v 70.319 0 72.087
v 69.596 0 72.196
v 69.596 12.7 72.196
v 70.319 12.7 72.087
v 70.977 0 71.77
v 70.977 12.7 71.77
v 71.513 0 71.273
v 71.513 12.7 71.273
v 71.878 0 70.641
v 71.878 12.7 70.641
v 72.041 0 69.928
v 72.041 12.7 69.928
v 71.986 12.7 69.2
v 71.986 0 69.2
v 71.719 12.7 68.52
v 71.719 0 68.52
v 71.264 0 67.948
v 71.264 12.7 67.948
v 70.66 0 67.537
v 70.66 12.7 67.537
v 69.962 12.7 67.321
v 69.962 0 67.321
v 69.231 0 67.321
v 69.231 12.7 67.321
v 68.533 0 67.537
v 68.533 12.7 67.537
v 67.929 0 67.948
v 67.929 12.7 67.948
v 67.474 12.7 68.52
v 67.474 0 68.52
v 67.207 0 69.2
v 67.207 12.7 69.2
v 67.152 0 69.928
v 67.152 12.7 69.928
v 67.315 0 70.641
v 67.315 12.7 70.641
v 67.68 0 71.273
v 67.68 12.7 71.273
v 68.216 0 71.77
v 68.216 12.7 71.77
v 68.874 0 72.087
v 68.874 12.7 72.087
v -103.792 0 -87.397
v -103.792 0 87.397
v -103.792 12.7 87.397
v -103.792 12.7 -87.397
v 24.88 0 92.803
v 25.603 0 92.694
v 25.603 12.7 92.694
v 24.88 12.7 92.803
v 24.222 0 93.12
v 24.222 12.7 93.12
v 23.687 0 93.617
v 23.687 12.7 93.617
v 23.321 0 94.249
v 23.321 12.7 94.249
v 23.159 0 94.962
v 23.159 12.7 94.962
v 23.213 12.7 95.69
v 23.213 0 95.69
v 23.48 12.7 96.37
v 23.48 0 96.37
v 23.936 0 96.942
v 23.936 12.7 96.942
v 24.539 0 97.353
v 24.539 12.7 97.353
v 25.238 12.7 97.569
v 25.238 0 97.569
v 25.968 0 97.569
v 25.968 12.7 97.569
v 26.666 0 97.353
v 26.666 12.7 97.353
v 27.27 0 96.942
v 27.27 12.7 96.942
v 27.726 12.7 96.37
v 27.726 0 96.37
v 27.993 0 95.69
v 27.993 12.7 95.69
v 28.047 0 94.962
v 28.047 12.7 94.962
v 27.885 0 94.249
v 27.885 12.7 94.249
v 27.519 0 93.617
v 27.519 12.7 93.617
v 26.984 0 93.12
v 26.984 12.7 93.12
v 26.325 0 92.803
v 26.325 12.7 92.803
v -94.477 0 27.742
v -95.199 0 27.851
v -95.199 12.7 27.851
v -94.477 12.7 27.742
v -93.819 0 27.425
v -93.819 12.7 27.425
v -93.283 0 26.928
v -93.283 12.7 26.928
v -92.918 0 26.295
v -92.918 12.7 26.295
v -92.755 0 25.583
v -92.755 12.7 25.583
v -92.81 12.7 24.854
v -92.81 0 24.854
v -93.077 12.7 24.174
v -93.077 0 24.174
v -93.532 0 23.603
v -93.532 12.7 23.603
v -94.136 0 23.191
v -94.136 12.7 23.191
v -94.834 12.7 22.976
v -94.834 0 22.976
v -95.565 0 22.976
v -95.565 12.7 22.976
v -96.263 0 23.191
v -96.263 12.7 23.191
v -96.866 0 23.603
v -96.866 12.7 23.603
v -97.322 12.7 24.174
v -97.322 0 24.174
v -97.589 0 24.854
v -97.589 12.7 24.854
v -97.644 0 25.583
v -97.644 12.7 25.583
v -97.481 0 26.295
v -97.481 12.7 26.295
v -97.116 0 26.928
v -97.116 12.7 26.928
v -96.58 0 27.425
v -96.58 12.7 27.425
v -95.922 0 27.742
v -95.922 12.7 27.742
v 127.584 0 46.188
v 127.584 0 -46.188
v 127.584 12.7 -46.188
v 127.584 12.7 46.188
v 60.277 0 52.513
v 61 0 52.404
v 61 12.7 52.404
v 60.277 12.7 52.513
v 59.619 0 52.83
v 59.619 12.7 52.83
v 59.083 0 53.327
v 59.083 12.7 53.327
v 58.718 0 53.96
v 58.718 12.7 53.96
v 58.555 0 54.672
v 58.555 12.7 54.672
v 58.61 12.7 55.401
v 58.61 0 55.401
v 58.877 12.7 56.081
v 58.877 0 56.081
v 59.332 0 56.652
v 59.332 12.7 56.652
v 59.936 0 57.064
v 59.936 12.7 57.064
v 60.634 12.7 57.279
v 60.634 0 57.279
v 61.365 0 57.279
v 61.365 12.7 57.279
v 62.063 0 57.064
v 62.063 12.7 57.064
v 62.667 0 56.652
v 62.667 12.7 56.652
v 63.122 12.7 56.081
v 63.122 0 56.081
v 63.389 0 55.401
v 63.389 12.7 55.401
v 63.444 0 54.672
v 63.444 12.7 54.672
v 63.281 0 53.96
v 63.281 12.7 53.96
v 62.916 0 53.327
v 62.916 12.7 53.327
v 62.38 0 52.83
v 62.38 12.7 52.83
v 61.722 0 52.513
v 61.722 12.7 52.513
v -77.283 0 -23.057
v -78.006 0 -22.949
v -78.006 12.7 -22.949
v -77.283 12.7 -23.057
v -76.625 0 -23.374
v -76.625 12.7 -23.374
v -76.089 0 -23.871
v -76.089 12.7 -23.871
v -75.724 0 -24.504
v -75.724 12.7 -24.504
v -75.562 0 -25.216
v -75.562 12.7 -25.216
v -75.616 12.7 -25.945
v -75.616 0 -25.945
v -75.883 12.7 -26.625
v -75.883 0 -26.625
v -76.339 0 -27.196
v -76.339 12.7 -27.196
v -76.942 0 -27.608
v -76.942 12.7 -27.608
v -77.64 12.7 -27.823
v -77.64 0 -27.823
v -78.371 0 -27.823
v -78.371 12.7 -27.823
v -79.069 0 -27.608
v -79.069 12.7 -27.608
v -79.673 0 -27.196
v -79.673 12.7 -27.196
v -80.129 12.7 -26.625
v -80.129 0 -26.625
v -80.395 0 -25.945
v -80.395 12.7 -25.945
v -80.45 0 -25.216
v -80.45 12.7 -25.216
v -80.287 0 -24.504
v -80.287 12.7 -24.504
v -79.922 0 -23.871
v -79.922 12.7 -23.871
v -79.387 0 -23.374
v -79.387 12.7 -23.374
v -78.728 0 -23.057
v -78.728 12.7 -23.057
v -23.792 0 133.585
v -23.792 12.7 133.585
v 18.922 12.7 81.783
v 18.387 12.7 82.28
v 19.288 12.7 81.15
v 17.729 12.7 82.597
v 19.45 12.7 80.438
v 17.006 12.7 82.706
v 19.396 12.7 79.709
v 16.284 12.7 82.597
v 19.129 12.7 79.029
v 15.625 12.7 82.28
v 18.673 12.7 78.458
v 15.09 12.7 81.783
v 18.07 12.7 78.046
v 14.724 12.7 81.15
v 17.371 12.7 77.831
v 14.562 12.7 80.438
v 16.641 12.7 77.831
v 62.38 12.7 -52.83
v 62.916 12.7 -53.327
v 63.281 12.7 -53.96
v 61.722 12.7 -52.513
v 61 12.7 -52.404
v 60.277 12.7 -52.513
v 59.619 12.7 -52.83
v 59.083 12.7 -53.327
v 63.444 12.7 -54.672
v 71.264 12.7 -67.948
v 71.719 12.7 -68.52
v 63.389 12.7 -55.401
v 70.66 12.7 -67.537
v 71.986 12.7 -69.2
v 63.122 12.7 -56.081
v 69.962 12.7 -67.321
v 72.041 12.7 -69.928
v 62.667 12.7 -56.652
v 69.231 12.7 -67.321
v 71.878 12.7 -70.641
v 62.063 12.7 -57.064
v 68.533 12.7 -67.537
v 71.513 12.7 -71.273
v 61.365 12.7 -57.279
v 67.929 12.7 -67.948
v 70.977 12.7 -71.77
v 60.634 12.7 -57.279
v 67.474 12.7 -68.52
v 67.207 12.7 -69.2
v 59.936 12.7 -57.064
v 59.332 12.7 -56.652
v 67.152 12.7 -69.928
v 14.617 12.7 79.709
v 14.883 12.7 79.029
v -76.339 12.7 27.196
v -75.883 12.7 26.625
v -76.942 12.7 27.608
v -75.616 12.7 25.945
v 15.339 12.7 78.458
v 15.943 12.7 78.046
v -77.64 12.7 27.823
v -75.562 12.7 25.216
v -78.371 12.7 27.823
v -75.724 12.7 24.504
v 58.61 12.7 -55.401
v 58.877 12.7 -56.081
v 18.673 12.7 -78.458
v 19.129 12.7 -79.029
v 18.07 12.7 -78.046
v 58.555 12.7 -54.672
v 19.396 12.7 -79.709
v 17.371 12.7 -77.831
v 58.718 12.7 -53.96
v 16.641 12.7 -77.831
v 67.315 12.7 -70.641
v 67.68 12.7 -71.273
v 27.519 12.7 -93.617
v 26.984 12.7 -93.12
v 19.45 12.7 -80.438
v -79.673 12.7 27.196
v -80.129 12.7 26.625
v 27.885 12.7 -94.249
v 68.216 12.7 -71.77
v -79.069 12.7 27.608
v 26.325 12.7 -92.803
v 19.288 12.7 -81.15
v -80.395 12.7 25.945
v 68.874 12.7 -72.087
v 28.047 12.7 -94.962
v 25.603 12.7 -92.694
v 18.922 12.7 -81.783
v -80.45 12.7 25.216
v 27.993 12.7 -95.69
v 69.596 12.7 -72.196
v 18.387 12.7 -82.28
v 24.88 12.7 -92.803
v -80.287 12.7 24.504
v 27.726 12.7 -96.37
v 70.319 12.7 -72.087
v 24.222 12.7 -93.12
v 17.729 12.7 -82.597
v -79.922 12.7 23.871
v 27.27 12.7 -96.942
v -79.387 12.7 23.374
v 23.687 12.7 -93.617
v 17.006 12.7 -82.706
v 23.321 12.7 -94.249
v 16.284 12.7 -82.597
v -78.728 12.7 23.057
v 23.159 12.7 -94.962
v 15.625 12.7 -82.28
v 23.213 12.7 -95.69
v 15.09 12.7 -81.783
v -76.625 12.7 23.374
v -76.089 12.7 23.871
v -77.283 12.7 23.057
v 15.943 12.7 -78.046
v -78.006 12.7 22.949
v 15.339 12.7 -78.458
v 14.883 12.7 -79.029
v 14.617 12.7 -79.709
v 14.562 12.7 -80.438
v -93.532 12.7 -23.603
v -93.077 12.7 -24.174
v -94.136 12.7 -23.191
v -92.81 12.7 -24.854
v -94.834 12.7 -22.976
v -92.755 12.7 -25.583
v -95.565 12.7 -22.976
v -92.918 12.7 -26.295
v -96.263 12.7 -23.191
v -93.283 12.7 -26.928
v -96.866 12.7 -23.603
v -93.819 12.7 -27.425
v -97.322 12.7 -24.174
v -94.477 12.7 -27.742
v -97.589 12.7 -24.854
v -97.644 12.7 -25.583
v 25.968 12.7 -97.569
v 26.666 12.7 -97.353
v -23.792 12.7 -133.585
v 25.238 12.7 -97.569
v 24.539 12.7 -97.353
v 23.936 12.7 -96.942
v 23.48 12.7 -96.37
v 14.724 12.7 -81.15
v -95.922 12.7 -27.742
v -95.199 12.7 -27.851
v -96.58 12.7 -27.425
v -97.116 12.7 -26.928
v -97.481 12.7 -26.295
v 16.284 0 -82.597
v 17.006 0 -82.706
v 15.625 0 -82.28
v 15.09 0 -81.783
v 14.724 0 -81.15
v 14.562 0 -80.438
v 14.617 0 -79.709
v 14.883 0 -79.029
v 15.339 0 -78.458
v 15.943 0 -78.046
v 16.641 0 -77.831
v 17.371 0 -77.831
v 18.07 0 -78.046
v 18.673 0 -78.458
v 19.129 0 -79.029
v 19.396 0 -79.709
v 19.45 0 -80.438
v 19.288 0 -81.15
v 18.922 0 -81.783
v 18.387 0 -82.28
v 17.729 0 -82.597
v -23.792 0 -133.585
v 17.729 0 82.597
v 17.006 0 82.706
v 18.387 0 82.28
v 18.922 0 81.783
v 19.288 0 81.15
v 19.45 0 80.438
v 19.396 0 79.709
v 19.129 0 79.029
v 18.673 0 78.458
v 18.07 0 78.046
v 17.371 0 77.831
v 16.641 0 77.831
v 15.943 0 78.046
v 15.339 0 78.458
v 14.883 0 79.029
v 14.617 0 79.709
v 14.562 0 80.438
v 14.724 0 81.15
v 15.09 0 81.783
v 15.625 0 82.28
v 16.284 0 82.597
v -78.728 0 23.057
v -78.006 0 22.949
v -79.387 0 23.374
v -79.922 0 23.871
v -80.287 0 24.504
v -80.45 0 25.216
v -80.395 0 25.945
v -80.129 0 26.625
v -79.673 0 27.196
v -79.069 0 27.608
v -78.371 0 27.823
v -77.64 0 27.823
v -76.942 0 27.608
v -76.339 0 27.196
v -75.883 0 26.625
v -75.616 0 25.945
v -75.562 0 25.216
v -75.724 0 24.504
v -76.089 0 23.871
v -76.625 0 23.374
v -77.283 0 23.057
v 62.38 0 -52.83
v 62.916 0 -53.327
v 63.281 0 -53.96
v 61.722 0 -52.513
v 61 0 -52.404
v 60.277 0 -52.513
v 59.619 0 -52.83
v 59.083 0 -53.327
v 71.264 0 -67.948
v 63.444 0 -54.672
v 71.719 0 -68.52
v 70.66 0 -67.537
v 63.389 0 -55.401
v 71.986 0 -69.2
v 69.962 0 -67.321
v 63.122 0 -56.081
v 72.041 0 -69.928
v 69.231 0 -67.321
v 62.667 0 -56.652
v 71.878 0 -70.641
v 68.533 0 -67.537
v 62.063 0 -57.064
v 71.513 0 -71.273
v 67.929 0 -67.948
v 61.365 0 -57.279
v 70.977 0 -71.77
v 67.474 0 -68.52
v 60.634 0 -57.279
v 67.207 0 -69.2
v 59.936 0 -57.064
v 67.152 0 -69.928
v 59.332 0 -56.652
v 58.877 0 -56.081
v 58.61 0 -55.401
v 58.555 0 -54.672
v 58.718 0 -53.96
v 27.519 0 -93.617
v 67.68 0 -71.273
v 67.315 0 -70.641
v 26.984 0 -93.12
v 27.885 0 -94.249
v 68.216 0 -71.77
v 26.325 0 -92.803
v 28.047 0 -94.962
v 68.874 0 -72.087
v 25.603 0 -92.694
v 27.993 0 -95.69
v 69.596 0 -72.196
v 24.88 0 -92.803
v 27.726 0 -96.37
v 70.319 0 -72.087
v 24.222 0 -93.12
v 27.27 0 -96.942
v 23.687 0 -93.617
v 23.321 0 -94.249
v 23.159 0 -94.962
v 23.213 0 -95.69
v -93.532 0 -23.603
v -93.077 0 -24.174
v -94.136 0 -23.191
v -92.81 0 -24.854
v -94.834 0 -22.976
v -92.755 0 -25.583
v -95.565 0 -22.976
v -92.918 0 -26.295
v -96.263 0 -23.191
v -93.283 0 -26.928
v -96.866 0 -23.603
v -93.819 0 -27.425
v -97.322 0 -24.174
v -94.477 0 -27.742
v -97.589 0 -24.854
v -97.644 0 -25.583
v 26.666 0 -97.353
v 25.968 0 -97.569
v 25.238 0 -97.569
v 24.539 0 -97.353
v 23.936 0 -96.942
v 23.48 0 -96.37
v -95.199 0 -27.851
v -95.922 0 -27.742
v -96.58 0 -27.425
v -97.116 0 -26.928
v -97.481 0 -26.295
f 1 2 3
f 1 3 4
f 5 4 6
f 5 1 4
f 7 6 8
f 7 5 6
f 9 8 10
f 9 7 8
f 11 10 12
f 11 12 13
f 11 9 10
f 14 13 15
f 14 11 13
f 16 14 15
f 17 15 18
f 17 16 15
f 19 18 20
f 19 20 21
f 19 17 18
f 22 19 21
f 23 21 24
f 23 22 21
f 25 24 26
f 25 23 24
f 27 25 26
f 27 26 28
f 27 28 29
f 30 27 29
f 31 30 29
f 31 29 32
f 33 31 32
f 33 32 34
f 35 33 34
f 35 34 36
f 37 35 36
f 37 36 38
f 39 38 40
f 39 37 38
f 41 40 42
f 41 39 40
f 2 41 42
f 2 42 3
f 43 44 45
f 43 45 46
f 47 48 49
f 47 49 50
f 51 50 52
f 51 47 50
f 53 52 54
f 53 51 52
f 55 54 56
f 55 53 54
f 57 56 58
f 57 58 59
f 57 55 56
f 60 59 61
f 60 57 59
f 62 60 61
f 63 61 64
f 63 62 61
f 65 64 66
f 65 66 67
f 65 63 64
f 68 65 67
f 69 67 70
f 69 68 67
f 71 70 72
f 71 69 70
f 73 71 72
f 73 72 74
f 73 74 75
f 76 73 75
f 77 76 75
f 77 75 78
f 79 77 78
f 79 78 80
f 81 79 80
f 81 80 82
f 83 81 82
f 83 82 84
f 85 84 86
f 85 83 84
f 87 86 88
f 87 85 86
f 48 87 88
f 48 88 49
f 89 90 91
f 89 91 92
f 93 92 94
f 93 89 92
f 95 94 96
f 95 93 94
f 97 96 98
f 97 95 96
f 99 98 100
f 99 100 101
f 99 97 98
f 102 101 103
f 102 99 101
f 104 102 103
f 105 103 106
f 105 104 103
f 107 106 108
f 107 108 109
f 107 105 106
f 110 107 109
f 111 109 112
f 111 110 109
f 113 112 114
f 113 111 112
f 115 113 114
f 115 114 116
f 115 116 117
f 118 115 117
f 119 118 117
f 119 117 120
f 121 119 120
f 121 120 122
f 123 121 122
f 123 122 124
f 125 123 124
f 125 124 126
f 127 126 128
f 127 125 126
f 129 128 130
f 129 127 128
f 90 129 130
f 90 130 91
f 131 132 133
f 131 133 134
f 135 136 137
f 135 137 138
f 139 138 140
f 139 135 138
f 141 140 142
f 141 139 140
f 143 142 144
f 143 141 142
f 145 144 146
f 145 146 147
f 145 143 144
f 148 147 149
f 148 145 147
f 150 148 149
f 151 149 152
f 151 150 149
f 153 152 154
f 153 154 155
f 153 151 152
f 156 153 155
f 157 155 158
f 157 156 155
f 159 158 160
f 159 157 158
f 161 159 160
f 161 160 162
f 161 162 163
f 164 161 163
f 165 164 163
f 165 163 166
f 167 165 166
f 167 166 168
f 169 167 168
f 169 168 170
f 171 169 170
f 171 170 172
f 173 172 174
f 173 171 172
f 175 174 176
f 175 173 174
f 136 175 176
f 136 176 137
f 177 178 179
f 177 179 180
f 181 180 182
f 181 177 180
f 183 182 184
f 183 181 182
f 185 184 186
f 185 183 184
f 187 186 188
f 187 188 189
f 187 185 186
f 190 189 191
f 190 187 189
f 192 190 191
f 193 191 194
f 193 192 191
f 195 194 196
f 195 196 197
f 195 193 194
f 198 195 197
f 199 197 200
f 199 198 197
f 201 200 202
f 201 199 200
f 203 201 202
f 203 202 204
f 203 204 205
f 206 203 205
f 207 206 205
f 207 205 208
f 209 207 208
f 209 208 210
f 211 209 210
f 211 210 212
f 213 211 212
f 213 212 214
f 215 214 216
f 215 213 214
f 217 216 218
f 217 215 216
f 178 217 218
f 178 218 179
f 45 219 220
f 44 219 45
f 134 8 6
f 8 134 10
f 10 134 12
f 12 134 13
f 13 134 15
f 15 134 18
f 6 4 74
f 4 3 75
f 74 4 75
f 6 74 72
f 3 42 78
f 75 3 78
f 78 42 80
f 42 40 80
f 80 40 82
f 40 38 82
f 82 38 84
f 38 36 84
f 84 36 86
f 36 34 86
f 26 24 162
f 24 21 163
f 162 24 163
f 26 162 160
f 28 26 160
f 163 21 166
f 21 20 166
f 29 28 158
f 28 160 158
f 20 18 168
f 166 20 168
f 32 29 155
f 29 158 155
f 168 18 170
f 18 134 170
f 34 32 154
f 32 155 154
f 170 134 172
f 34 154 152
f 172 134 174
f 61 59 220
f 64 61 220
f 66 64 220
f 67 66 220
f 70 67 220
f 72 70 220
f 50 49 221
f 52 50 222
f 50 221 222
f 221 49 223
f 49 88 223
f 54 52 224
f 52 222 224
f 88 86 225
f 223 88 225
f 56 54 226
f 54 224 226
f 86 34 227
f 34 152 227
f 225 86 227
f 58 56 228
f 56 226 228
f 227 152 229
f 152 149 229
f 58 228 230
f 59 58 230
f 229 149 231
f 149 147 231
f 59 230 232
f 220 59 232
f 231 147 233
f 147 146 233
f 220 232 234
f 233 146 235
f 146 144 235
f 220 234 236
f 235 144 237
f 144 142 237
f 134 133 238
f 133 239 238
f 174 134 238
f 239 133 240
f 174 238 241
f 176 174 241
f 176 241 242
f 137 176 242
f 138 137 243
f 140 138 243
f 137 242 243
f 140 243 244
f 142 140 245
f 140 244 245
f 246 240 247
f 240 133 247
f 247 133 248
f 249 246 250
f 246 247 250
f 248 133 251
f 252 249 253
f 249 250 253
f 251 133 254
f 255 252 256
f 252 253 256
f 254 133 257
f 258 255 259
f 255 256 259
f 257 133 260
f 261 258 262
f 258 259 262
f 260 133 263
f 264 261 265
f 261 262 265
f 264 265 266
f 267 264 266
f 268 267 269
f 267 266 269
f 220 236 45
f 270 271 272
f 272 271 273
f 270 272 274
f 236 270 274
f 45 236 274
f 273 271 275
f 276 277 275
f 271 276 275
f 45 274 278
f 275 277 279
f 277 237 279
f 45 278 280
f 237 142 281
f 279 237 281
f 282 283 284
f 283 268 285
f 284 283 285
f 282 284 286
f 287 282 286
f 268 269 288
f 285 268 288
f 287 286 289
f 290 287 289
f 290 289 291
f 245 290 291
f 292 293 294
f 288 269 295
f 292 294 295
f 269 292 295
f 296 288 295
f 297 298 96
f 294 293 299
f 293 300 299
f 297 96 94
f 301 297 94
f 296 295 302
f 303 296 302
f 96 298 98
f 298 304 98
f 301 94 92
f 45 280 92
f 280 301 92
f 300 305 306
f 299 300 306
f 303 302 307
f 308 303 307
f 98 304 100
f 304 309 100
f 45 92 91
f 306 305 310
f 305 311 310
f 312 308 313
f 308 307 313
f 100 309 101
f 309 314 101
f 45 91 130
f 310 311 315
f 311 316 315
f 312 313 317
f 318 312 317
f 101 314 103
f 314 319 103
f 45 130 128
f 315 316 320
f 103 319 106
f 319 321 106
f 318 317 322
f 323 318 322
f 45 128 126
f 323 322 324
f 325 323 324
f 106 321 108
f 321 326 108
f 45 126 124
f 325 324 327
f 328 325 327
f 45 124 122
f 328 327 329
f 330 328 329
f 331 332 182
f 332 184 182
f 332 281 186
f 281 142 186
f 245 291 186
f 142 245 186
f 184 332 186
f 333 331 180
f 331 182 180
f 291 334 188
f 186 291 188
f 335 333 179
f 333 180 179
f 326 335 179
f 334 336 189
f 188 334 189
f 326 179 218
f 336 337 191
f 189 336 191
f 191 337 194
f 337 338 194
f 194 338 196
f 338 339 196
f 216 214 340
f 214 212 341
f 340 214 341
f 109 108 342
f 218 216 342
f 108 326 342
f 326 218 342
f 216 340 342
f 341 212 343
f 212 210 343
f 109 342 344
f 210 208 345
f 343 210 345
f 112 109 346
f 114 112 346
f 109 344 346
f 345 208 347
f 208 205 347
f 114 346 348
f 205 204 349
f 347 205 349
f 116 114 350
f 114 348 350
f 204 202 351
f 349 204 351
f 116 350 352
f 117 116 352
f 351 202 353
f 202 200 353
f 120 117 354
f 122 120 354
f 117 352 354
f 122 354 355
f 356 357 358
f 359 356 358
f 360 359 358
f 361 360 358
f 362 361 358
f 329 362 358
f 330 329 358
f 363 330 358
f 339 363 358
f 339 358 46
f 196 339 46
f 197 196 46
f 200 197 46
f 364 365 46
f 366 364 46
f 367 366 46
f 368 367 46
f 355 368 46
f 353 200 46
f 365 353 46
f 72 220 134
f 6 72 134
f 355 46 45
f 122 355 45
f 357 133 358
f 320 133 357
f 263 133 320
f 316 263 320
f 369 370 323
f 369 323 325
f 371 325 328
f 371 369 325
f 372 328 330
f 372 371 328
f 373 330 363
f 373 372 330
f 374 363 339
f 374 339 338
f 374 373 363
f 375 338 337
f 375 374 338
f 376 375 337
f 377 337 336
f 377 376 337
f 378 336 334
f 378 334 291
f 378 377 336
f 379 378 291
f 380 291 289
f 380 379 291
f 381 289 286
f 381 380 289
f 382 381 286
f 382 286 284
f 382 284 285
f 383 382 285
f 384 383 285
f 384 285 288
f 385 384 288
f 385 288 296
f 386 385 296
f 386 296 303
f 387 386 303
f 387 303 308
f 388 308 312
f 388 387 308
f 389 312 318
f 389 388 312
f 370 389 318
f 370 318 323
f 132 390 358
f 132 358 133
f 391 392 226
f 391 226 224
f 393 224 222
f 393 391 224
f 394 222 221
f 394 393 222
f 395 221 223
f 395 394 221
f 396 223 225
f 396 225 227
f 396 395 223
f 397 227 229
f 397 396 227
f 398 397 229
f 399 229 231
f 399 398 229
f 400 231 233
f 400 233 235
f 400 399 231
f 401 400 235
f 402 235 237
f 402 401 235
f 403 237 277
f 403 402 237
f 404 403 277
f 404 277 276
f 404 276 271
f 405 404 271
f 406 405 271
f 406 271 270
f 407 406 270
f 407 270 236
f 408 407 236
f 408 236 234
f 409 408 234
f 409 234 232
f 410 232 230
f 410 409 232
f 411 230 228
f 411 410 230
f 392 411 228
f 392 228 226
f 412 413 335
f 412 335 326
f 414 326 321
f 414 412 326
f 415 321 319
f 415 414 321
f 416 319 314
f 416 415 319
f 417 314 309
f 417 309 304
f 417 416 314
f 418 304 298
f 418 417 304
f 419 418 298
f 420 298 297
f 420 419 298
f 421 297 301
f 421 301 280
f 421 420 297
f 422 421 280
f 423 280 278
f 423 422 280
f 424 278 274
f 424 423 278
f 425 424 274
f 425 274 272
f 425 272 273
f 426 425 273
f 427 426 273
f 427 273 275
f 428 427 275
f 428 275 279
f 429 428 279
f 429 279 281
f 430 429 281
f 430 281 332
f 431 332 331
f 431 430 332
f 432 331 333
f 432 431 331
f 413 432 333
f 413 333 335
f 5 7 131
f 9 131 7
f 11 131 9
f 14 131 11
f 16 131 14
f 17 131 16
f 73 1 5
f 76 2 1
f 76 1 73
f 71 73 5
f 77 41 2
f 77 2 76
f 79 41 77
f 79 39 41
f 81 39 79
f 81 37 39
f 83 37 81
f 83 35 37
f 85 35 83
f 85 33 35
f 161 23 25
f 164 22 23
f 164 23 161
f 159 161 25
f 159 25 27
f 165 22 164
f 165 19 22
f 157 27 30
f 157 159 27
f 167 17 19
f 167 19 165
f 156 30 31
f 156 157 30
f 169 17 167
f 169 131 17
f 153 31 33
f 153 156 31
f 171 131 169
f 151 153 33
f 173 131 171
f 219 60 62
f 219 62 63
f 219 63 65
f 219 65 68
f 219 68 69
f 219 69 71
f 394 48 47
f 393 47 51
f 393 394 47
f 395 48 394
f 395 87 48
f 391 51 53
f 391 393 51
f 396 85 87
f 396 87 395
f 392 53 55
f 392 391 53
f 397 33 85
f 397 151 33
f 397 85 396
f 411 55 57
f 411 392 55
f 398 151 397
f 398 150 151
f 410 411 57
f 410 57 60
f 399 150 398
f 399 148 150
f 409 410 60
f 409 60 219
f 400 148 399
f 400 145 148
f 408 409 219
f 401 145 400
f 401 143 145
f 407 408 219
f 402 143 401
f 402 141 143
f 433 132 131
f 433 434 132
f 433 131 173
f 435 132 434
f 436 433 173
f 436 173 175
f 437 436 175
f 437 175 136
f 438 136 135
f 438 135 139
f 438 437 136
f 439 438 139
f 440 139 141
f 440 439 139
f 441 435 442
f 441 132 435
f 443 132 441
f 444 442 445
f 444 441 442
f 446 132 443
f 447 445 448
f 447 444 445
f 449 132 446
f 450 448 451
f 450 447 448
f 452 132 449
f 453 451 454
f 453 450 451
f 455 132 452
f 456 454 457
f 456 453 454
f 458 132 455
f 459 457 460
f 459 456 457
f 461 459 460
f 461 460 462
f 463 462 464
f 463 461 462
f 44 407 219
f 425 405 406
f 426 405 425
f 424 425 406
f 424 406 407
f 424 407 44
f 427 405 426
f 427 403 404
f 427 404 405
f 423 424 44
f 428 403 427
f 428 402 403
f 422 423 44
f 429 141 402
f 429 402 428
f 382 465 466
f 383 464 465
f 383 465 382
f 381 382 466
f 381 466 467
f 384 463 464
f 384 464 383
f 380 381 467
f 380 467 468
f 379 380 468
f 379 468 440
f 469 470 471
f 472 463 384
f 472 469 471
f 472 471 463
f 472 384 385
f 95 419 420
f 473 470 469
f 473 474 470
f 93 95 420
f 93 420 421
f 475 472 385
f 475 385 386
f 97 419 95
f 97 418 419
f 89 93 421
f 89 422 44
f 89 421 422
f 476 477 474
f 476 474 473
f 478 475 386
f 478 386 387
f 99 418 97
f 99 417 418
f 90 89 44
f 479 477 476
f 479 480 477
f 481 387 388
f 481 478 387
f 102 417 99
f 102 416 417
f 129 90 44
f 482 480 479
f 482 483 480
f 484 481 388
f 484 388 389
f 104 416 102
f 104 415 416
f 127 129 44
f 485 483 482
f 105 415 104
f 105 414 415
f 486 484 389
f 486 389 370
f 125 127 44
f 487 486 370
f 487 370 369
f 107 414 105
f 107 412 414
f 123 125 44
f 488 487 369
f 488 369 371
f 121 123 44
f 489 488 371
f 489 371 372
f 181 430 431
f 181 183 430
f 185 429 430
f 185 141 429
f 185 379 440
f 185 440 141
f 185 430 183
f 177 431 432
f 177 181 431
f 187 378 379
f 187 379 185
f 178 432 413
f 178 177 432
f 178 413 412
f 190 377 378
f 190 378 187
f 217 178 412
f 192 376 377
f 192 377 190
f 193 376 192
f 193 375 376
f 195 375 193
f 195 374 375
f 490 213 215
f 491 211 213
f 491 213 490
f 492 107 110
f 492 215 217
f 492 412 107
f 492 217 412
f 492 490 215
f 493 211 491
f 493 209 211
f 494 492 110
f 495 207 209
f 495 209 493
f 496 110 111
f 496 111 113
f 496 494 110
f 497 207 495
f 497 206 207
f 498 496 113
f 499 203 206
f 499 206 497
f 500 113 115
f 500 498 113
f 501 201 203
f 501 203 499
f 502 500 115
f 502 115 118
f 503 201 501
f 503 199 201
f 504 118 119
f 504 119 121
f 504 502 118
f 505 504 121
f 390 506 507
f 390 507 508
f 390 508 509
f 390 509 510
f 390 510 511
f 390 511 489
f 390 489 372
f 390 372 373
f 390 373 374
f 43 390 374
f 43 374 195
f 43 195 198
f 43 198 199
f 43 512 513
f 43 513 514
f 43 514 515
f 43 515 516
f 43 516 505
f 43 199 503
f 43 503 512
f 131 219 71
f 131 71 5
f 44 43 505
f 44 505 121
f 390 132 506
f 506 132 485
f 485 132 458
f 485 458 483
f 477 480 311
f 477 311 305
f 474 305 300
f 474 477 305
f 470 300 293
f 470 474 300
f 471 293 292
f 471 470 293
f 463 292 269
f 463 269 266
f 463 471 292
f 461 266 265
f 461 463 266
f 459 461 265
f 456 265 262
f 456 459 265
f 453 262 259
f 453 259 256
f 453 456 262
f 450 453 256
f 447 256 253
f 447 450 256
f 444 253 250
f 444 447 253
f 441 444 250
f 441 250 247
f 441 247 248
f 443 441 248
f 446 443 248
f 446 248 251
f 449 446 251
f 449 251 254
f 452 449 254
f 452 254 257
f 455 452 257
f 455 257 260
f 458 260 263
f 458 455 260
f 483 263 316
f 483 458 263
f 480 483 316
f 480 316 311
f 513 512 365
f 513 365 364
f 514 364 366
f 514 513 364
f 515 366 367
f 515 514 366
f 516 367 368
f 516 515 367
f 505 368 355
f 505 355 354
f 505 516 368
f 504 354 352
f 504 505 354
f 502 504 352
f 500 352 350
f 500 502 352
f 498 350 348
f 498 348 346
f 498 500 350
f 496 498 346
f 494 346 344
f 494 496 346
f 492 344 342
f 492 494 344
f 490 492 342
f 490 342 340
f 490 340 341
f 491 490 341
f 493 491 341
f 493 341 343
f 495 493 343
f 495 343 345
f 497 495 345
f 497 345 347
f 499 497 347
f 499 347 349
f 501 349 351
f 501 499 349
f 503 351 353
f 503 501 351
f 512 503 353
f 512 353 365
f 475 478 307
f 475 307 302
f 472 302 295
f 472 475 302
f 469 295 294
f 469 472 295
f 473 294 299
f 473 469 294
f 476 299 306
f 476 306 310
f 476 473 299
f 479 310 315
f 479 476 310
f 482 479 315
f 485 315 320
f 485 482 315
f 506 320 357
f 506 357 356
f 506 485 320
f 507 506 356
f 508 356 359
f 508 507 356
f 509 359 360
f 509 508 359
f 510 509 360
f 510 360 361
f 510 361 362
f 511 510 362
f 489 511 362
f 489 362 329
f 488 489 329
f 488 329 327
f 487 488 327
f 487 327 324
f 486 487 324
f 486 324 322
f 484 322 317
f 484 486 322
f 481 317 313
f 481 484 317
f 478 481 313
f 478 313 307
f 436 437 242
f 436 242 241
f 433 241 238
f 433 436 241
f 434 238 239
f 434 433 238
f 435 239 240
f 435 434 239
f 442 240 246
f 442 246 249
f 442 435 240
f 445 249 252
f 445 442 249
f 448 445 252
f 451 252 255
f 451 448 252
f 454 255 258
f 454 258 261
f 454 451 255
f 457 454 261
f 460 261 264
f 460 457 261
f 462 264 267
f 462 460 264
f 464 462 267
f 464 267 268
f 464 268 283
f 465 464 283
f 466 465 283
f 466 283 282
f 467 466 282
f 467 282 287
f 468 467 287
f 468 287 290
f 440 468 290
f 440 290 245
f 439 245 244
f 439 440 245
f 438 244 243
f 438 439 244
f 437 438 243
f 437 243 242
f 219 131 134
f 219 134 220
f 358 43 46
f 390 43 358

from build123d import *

# Parameters (mm, degrees)
SKETCH2_R           = 2.4511
BOSS_EXTRUDE1_DEPTH = 12.7


with BuildPart() as part:
    # Sketch2 → Boss-Extrude1 (new body)
    with BuildSketch(Plane(origin=(0, 0, 0), x_dir=(1, 0, 0), z_dir=(0, 1, 0))):
        Polygon((127.583980757, 46.188021535), (127.583980757, -46.188021535), (-23.791990378, -133.584979219), (-103.791990378, -87.396957684), (-103.791990378, 87.396957684), (-23.791990378, 133.584979219), align=None)
        with Locations(Location((69.596393923, -69.745175923, 0), (0, 0, 270))):
            Circle(SKETCH2_R, mode=Mode.SUBTRACT)
        with Locations(Location((25.602897179, -95.144833111, 0), (0, 0, 90))):
            Circle(SKETCH2_R, mode=Mode.SUBTRACT)
        with Locations(Location((60.999643199, -54.855166889, 0), (0, 0, 90))):
            Circle(SKETCH2_R, mode=Mode.SUBTRACT)
        with Locations(Location((17.006146456, -80.254824077, 0), (0, 0, 270))):
            Circle(SKETCH2_R, mode=Mode.SUBTRACT)
        with Locations(Location((-78.005789655, -25.399657187, 0), (0, 0, 90))):
            Circle(SKETCH2_R, mode=Mode.SUBTRACT)
        with Locations(Location((-95.199291102, -25.399657187, 0), (0, 0, 270))):
            Circle(SKETCH2_R, mode=Mode.SUBTRACT)
        with Locations(Location((-95.199291102, 25.399657187, 0), (0, 0, 90))):
            Circle(SKETCH2_R, mode=Mode.SUBTRACT)
        with Locations(Location((-78.005789655, 25.399657187, 0), (0, 0, 270))):
            Circle(SKETCH2_R, mode=Mode.SUBTRACT)
        with Locations(Location((60.999643199, 54.855166889, 0), (0, 0, 270))):
            Circle(SKETCH2_R, mode=Mode.SUBTRACT)
        with Locations(Location((69.596393923, 69.745175923, 0), (0, 0, 90))):
            Circle(SKETCH2_R, mode=Mode.SUBTRACT)
        with Locations(Location((25.602897179, 95.144833111, 0), (0, 0, 270))):
            Circle(SKETCH2_R, mode=Mode.SUBTRACT)
        with Locations(Location((17.006146456, 80.254824077, 0), (0, 0, 90))):
            Circle(SKETCH2_R, mode=Mode.SUBTRACT)
    extrude(amount=BOSS_EXTRUDE1_DEPTH)


solid = part.part
